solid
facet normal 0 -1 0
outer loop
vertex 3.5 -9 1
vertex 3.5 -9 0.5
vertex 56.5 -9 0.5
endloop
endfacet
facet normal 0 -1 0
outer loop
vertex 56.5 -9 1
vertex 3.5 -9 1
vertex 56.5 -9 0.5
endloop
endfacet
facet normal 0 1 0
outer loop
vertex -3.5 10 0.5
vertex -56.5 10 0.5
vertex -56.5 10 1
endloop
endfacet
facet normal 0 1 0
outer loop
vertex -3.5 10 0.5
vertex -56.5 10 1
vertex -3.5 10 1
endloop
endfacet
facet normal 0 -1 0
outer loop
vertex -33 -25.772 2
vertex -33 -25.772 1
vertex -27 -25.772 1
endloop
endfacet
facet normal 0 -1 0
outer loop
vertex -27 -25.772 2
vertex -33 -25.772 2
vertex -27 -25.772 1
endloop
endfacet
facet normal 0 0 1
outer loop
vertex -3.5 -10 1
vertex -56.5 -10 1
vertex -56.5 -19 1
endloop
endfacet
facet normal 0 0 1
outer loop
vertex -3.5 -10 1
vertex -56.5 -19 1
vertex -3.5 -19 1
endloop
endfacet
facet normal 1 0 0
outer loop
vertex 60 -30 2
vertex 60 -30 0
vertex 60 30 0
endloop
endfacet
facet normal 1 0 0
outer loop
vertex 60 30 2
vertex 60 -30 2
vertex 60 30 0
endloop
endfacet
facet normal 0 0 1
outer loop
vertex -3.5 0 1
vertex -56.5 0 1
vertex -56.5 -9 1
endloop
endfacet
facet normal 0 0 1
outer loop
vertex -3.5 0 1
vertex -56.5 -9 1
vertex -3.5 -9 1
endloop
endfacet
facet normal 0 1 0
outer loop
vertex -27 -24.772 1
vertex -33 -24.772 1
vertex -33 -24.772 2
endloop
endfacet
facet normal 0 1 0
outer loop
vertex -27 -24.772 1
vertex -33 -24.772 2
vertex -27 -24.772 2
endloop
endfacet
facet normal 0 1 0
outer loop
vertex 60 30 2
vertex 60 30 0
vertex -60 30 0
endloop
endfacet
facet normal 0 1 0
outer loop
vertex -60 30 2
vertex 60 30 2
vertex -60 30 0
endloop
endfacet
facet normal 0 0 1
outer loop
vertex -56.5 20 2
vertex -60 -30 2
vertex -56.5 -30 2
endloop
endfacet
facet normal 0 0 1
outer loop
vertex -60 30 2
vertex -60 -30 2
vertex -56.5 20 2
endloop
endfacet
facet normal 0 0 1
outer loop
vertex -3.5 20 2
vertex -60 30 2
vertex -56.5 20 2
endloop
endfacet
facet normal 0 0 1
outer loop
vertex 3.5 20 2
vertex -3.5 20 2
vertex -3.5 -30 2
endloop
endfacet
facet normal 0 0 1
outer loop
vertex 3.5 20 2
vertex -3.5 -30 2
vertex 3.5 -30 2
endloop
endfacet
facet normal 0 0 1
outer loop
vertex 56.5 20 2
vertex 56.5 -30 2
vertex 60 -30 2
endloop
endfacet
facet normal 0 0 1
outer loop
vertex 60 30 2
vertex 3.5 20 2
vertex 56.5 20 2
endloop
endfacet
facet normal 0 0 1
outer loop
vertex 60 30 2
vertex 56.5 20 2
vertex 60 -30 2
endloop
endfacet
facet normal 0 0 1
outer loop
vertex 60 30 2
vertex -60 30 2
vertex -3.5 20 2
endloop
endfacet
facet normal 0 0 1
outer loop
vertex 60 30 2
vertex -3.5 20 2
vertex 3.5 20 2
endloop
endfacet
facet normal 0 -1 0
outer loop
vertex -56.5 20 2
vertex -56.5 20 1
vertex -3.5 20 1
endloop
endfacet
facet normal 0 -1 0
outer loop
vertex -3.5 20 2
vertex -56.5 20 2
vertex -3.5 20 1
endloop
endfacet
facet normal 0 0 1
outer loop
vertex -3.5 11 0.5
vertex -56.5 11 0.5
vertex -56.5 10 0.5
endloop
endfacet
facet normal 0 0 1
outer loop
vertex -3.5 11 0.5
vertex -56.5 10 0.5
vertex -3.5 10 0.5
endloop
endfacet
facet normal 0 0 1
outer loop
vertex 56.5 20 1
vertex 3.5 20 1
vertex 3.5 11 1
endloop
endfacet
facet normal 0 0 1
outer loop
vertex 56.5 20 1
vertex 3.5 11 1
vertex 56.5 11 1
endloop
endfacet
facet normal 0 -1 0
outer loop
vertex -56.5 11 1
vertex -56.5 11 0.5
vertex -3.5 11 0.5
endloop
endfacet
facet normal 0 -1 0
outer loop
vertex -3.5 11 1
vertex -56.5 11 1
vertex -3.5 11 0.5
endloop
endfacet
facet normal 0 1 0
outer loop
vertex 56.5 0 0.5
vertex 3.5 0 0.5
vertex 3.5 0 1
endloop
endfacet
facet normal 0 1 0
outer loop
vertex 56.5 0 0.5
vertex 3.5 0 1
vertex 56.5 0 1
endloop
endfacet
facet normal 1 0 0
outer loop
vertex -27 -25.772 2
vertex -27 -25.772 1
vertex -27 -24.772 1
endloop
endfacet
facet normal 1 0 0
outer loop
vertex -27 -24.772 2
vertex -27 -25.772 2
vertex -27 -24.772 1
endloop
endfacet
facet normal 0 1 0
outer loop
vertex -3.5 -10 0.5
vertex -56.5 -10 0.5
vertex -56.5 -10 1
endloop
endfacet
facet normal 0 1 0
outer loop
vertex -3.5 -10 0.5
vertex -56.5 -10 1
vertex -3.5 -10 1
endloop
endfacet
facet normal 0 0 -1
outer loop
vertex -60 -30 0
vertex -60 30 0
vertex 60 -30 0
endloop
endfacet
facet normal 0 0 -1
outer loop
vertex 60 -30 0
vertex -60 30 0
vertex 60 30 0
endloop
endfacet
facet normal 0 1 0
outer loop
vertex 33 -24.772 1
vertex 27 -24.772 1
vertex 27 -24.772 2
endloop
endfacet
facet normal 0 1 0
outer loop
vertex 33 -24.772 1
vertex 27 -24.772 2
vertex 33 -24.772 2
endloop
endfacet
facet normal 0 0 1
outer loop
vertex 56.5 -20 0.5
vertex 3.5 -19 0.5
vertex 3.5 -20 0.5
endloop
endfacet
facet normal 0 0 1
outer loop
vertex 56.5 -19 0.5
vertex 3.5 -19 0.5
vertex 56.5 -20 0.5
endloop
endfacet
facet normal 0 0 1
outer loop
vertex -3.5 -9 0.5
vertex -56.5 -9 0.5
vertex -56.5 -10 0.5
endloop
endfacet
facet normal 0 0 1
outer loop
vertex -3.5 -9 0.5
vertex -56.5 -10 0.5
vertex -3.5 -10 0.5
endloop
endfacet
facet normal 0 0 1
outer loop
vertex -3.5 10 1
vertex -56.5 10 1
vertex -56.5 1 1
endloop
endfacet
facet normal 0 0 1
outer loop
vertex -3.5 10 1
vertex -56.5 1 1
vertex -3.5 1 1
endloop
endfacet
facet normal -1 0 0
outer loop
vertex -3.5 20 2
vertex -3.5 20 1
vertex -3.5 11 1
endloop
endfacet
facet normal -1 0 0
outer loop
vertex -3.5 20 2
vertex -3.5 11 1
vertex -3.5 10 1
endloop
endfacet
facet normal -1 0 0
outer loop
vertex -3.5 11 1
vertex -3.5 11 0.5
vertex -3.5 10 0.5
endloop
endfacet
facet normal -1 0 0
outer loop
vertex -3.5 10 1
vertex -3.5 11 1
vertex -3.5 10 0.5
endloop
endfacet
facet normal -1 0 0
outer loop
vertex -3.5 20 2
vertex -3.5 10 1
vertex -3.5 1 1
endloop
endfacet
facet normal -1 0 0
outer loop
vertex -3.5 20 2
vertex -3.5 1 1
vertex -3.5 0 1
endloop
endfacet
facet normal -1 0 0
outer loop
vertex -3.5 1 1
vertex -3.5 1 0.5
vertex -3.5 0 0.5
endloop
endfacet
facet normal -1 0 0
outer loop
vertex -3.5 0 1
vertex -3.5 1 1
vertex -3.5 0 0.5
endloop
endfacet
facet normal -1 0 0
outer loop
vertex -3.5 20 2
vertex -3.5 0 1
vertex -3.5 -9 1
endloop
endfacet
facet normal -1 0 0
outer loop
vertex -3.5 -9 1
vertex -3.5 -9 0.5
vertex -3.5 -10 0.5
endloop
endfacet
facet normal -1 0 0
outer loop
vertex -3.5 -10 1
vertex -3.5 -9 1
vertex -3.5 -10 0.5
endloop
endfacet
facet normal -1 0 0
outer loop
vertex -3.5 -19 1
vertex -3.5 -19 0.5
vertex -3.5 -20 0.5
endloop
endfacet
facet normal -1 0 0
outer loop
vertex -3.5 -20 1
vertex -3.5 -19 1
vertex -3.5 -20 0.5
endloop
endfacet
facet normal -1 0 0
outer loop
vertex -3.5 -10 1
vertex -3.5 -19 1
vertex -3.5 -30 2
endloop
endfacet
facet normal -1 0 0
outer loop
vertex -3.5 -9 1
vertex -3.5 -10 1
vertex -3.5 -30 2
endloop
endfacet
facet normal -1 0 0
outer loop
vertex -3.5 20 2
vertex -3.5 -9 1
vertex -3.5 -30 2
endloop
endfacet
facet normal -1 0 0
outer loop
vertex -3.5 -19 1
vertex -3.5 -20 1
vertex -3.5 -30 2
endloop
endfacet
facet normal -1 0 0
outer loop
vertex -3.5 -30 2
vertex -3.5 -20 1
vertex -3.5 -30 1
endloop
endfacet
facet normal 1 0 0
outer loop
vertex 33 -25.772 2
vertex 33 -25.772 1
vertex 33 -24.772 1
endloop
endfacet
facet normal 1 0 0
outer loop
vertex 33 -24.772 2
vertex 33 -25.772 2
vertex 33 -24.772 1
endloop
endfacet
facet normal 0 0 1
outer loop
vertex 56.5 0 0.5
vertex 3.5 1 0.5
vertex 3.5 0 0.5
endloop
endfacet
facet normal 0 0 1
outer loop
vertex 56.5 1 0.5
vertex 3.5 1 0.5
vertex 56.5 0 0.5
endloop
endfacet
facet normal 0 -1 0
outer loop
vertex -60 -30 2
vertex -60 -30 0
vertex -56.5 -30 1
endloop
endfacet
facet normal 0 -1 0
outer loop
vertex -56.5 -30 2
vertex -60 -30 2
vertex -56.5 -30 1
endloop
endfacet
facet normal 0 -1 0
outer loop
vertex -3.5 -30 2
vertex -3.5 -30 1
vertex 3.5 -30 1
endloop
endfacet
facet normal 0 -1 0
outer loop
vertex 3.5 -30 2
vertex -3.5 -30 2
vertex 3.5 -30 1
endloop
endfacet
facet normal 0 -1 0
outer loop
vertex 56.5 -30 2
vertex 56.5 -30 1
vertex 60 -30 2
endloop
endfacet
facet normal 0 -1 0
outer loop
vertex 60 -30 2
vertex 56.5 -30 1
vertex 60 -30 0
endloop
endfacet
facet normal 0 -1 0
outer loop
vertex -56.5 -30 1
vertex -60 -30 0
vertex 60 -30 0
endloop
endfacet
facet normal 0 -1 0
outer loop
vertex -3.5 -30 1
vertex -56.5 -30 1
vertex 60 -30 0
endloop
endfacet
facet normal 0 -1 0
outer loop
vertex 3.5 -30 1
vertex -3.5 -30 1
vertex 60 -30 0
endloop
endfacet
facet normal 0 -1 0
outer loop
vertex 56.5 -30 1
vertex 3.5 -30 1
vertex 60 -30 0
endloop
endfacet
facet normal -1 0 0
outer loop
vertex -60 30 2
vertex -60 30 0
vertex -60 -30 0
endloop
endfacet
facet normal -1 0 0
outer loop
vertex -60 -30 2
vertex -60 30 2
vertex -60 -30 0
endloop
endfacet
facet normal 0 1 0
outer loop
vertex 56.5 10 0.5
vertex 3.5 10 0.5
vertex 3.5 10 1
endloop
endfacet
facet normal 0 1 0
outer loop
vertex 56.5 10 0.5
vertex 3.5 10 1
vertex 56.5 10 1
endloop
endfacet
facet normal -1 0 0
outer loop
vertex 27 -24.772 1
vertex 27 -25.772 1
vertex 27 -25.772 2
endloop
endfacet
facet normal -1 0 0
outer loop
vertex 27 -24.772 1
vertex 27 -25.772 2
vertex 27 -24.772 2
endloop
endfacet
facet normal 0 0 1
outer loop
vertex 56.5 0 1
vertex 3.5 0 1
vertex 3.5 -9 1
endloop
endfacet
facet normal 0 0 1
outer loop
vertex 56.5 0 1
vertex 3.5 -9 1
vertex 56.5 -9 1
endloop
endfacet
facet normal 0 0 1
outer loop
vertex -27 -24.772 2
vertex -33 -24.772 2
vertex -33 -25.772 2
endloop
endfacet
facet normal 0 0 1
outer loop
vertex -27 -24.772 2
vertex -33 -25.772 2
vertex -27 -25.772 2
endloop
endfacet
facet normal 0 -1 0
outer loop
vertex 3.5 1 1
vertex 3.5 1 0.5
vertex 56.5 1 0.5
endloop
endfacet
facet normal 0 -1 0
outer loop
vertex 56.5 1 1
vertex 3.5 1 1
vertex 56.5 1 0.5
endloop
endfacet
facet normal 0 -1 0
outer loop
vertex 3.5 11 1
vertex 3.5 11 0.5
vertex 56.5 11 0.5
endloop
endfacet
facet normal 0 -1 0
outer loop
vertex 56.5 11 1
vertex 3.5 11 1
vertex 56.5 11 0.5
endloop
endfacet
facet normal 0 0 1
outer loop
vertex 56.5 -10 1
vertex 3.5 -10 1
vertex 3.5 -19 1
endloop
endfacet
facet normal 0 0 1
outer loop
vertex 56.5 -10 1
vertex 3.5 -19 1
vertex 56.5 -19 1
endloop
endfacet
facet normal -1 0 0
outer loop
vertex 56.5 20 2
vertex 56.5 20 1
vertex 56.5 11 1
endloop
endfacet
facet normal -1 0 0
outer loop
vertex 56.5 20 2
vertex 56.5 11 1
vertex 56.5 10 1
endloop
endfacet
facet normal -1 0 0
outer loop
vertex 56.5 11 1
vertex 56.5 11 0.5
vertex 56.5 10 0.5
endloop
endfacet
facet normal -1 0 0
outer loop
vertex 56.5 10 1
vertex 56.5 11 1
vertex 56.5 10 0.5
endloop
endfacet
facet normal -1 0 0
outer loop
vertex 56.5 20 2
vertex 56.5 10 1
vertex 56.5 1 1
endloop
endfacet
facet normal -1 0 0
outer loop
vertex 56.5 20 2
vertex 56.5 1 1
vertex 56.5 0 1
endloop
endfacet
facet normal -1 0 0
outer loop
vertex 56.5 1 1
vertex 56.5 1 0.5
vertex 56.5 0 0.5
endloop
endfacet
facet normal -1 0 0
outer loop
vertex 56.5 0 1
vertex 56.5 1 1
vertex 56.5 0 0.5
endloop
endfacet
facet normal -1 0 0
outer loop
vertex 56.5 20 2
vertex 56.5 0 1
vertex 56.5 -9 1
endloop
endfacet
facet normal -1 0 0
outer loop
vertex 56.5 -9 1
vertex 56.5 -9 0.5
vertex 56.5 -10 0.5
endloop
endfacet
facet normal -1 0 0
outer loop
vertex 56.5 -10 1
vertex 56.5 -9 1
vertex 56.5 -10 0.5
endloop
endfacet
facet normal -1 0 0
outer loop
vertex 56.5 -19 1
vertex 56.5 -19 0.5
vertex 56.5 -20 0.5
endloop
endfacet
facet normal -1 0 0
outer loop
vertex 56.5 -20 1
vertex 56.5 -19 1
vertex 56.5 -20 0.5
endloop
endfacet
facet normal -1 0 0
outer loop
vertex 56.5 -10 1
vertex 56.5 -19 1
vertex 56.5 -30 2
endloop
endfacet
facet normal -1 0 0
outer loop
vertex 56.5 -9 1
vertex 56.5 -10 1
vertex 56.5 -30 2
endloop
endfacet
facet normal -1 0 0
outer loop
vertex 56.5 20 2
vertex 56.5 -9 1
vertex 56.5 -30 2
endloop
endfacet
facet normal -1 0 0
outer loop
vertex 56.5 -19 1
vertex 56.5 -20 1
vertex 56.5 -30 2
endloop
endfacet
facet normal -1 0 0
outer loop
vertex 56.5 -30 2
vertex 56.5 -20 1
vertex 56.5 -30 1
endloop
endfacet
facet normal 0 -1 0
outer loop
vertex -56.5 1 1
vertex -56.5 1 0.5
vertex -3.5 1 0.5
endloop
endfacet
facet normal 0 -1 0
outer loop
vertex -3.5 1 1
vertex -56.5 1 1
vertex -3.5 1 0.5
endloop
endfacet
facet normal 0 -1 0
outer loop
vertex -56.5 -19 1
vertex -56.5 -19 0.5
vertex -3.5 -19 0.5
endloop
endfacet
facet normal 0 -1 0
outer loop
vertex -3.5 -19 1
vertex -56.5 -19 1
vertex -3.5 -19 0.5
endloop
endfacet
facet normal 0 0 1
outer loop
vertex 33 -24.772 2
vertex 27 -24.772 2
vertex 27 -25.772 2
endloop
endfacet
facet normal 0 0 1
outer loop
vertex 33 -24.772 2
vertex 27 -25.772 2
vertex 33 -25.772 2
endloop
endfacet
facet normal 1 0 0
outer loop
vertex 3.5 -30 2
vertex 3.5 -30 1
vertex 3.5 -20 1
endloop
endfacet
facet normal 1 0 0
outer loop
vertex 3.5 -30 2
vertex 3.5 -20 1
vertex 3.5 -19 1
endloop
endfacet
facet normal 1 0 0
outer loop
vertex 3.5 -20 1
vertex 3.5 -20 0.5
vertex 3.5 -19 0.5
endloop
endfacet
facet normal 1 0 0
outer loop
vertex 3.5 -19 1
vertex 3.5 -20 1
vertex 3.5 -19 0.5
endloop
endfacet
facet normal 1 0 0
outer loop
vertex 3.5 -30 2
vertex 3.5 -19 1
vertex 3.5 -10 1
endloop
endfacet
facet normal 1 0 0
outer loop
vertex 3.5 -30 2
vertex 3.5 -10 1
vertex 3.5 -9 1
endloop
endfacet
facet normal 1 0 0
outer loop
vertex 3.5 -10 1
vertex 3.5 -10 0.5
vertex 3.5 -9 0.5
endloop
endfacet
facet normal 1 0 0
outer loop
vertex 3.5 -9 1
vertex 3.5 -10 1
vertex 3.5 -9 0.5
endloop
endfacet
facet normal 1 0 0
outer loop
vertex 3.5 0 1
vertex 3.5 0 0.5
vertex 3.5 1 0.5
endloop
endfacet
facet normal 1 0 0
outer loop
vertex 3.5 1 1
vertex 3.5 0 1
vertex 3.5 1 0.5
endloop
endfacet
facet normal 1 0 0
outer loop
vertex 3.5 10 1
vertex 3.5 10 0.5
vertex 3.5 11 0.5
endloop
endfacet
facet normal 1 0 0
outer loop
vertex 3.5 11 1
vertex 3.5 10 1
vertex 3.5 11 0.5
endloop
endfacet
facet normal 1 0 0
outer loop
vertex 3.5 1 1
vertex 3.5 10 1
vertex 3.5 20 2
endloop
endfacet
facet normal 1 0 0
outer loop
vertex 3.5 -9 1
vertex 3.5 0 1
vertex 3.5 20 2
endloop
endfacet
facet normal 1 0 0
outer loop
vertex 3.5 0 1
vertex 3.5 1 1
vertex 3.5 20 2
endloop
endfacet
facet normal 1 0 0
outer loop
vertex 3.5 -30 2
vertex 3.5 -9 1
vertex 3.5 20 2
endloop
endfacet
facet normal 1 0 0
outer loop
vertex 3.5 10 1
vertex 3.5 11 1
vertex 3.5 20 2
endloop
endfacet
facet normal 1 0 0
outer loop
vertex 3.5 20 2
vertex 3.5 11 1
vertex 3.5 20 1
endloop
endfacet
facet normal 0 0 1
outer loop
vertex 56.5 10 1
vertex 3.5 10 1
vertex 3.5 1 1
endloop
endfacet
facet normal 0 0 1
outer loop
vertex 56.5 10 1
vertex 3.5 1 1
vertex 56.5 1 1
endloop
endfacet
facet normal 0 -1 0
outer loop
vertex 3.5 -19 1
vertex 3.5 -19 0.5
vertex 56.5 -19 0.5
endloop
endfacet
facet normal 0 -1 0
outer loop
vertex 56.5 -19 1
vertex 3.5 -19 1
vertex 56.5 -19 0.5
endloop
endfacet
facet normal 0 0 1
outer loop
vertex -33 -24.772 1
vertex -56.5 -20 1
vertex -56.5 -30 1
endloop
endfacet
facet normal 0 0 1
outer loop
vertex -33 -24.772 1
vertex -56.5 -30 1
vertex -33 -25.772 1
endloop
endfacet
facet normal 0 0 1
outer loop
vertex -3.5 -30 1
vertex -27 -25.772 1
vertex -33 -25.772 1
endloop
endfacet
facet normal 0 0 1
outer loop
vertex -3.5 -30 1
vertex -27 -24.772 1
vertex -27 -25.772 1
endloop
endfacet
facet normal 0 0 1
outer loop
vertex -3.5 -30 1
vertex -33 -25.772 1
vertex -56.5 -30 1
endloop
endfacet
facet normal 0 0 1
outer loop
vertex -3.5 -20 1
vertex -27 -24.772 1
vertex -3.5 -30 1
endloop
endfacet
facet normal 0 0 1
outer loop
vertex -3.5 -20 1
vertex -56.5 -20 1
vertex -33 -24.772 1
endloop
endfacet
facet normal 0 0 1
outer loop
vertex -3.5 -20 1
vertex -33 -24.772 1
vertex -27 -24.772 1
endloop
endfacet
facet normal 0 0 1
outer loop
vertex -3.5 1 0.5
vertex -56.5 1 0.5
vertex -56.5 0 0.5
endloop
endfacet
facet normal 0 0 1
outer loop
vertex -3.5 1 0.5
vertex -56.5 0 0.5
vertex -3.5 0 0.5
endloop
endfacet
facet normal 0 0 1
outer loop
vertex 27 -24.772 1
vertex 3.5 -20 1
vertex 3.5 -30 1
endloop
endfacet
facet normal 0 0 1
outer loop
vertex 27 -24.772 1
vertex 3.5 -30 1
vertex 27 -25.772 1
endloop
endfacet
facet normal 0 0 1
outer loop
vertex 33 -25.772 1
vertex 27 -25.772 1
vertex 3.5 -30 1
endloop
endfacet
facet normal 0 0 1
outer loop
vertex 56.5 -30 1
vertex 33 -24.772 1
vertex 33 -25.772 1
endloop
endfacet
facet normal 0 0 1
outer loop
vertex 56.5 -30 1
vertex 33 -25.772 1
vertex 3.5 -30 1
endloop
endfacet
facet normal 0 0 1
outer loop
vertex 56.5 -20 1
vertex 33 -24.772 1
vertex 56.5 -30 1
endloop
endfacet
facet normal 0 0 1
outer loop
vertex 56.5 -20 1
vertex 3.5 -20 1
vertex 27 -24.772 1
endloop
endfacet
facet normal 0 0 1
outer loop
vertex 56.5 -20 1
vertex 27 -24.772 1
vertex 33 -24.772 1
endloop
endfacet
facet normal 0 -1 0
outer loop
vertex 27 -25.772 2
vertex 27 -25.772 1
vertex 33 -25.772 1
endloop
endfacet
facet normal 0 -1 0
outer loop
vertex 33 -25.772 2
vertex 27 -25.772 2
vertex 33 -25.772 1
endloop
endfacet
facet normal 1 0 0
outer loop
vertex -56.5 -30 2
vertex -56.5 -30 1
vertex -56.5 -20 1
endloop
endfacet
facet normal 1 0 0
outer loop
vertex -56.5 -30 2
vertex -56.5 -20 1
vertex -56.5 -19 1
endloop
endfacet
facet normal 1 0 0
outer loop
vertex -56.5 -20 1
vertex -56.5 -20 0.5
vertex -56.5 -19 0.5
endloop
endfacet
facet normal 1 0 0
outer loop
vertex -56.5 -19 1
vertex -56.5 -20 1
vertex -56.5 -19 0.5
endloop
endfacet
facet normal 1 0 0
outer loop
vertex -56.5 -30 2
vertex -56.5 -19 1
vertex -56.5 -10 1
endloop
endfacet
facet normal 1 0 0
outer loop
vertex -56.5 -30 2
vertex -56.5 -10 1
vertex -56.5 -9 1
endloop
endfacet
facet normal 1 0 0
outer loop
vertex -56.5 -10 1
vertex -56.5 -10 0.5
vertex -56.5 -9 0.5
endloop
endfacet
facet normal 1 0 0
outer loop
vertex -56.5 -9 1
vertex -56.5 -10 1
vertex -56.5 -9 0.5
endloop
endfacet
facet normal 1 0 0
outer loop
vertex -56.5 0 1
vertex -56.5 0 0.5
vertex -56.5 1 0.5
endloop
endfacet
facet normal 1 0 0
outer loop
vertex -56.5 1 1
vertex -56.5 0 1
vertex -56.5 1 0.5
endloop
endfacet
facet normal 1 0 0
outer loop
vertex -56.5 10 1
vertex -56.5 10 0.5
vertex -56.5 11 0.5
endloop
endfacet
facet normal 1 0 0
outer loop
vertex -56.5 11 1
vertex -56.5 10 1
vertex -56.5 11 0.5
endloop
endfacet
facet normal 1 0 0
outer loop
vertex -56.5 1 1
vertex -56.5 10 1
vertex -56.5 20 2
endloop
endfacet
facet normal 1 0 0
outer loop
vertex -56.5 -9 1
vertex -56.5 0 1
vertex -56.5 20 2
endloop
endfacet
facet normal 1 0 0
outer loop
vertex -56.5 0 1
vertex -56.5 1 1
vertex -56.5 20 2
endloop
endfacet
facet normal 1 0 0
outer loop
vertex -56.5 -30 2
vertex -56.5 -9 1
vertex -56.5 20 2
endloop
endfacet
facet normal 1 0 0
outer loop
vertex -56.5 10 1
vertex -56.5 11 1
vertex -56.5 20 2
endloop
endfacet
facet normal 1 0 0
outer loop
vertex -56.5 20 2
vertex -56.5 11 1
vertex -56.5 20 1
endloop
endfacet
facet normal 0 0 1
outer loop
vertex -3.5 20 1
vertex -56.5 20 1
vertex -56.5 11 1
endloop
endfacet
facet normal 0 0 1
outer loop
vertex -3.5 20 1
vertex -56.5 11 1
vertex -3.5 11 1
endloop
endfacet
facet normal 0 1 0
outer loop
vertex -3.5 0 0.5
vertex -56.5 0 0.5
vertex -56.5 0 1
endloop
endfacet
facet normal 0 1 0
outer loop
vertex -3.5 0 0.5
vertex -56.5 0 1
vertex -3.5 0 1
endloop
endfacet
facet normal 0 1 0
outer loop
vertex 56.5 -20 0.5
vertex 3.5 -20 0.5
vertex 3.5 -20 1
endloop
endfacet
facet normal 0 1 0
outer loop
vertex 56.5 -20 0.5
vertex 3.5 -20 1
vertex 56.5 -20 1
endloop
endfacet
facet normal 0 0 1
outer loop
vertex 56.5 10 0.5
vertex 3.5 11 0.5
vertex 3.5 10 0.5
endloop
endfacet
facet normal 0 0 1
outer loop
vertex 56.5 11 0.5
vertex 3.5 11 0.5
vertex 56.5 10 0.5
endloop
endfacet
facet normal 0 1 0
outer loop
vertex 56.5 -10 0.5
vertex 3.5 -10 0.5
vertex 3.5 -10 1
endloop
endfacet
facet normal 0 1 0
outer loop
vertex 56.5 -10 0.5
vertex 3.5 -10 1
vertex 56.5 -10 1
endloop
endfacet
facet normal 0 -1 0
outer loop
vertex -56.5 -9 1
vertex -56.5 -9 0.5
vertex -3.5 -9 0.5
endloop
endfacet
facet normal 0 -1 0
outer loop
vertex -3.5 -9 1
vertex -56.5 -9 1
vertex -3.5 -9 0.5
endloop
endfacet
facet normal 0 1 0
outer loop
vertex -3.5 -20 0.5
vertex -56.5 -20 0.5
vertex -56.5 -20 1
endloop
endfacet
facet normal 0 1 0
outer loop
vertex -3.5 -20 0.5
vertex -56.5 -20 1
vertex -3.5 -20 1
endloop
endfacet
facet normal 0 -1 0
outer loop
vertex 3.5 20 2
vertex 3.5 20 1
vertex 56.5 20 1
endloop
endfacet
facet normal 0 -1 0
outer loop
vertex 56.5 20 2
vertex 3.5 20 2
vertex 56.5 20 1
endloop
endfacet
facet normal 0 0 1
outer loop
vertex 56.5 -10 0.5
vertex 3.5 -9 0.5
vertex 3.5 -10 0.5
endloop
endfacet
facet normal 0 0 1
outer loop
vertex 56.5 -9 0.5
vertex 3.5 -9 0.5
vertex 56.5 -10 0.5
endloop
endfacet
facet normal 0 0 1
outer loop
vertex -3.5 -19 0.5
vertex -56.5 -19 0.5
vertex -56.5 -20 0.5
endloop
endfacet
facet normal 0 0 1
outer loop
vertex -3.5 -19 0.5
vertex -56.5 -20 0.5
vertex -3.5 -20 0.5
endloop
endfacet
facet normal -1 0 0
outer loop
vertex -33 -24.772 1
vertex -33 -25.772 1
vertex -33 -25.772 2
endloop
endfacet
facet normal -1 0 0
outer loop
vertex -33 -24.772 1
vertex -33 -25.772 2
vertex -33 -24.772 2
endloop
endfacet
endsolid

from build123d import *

# Parameters (mm, degrees)
F1_DEPTH = 2
F0_W     = 53
F0_H     = 9
F0_H_2   = 10
F0_W_2   = 6
F0_H_3   = 1
F2_DEPTH = 1
F3_DEPTH = 0.5
F4_DEPTH = 2


with BuildPart() as f1:
    # F0 (on Top) → F1 (new body)
    with BuildSketch(Plane.XY):
        Polygon((56.5, -30), (60, -30), (60, 30), (-60, 30), (-60, -30), (-56.5, -30), (-56.5, -20), (-56.5, -19), (-56.5, -10), (-56.5, -9), (-56.5, 0), (-56.5, 1), (-56.5, 10), (-56.5, 11), (-56.5, 20), (-3.5, 20), (-3.5, 11), (-3.5, 10), (-3.5, 1), (-3.5, 0), (-3.5, -9), (-3.5, -10), (-3.5, -19), (-3.5, -20), (-3.5, -30), (3.5, -30), (3.5, -20), (3.5, -19), (3.5, -10), (3.5, -9), (3.5, 0), (3.5, 1), (3.5, 10), (3.5, 11), (3.5, 20), (56.5, 20), (56.5, 11), (56.5, 10), (56.5, 1), (56.5, 0), (56.5, -9), (56.5, -10), (56.5, -19), (56.5, -20), align=None)
    extrude(amount=F1_DEPTH)

    # F0 (on Top) → F2 (join)
    with BuildSketch(Plane.XY):
        with Locations((-30, 15.5)):
            Rectangle(F0_W, F0_H)
        with Locations((-30, 5.5)):
            Rectangle(F0_W, F0_H)
        with Locations((-30, -4.5)):
            Rectangle(F0_W, F0_H)
        with Locations((-30, -14.5)):
            Rectangle(F0_W, F0_H)
        with Locations((-30, -25)):
            Rectangle(F0_W, F0_H_2)
        with Locations((-30, -25.271689)):
            Rectangle(F0_W_2, F0_H_3, mode=Mode.SUBTRACT)
        with Locations((30, -25)):
            Rectangle(F0_W, F0_H_2)
        with Locations((30, -25.271689)):
            Rectangle(F0_W_2, F0_H_3, mode=Mode.SUBTRACT)
        with Locations((30, -14.5)):
            Rectangle(F0_W, F0_H)
        with Locations((30, -4.5)):
            Rectangle(F0_W, F0_H)
        with Locations((30, 5.5)):
            Rectangle(F0_W, F0_H)
        with Locations((30, 15.5)):
            Rectangle(F0_W, F0_H)
    extrude(amount=F2_DEPTH)

    # F0 (on Top) → F3 (join)
    with BuildSketch(Plane.XY):
        with Locations((-30, 10.5)):
            Rectangle(F0_W, F0_H_3)
        with Locations((-30, 0.5)):
            Rectangle(F0_W, F0_H_3)
        with Locations((-30, -9.5)):
            Rectangle(F0_W, F0_H_3)
        with Locations((-30, -19.5)):
            Rectangle(F0_W, F0_H_3)
        with Locations((30, -19.5)):
            Rectangle(F0_W, F0_H_3)
        with Locations((30, -9.5)):
            Rectangle(F0_W, F0_H_3)
        with Locations((30, 0.5)):
            Rectangle(F0_W, F0_H_3)
        with Locations((30, 10.5)):
            Rectangle(F0_W, F0_H_3)
    extrude(amount=F3_DEPTH)

    # F0 (on Top) → F4 (join)
    with BuildSketch(Plane.XY):
        with Locations((-30, -25.271689)):
            Rectangle(F0_W_2, F0_H_3)
        with Locations((30, -25.271689)):
            Rectangle(F0_W_2, F0_H_3)
    extrude(amount=F4_DEPTH)


solid = f1.part
